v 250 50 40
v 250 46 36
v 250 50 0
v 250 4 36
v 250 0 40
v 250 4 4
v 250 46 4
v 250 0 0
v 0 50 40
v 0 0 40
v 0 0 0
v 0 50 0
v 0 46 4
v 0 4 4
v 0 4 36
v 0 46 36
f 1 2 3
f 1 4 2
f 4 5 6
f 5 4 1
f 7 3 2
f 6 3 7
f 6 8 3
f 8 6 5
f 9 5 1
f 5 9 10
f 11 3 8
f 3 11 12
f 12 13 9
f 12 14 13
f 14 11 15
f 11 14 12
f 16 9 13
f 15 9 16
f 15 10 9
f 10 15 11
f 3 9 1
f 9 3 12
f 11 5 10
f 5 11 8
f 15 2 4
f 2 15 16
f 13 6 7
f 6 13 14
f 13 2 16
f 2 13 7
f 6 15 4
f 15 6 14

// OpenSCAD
$fn = 32;

// ----------------------------------------------------------------------
// Box beam: 200-250 mm hollow beam
// ----------------------------------------------------------------------

// --- parameters (mm) ---
beam_l = 250;             // beam length, X
beam_w = 50;              // beam width, Y
beam_h = 40;              // beam height, Z
wall = 4;                 // wall thickness

difference() {
  cube([beam_l, beam_w, beam_h]);
  translate([-1, wall, wall])
    cube([beam_l + 2, beam_w - 2 * wall, beam_h - 2 * wall]);
}
